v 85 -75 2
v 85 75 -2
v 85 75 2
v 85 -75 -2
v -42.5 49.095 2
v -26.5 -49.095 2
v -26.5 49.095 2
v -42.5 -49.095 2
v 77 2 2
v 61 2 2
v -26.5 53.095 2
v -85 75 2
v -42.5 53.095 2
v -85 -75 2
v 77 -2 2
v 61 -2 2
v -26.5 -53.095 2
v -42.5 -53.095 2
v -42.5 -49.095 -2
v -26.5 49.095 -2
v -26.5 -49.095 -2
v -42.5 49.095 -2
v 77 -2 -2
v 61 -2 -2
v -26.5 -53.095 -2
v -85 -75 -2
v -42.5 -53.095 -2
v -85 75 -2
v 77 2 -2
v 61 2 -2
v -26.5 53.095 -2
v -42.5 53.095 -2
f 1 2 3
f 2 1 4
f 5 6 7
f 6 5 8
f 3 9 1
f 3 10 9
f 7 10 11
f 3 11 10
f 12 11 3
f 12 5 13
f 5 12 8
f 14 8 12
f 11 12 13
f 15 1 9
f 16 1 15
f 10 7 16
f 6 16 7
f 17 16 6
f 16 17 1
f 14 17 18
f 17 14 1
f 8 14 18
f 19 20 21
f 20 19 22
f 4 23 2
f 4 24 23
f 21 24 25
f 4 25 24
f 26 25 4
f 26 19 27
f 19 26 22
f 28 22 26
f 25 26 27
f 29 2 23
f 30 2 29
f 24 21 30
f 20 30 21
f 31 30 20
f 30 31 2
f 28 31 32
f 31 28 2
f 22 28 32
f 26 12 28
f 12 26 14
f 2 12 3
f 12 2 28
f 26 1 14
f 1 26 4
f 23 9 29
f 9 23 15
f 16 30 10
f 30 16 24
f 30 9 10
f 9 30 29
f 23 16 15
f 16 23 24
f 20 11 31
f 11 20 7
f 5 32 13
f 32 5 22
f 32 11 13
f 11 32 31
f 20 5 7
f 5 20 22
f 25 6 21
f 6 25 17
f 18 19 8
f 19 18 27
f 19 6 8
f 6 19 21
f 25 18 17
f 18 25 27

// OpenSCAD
// ========================================
// a 17 x 15 x 0.4 cm plate with three 1.6 x 0.4 cm slots
// NeuroCAD canonical IR; dimensions are millimetres
// ========================================
$fn = 48;

difference() {
  cube(size=[170, 150, 4], center=true);
  translate([69, 0, 0]) {
    cube(size=[16, 4, 6], center=true);
  }
  translate([-34.5, 51.0954988232819, 0]) {
    cube(size=[16, 4, 6], center=true);
  }
  translate([-34.5, -51.0954988232819, 0]) {
    cube(size=[16, 4, 6], center=true);
  }
}
